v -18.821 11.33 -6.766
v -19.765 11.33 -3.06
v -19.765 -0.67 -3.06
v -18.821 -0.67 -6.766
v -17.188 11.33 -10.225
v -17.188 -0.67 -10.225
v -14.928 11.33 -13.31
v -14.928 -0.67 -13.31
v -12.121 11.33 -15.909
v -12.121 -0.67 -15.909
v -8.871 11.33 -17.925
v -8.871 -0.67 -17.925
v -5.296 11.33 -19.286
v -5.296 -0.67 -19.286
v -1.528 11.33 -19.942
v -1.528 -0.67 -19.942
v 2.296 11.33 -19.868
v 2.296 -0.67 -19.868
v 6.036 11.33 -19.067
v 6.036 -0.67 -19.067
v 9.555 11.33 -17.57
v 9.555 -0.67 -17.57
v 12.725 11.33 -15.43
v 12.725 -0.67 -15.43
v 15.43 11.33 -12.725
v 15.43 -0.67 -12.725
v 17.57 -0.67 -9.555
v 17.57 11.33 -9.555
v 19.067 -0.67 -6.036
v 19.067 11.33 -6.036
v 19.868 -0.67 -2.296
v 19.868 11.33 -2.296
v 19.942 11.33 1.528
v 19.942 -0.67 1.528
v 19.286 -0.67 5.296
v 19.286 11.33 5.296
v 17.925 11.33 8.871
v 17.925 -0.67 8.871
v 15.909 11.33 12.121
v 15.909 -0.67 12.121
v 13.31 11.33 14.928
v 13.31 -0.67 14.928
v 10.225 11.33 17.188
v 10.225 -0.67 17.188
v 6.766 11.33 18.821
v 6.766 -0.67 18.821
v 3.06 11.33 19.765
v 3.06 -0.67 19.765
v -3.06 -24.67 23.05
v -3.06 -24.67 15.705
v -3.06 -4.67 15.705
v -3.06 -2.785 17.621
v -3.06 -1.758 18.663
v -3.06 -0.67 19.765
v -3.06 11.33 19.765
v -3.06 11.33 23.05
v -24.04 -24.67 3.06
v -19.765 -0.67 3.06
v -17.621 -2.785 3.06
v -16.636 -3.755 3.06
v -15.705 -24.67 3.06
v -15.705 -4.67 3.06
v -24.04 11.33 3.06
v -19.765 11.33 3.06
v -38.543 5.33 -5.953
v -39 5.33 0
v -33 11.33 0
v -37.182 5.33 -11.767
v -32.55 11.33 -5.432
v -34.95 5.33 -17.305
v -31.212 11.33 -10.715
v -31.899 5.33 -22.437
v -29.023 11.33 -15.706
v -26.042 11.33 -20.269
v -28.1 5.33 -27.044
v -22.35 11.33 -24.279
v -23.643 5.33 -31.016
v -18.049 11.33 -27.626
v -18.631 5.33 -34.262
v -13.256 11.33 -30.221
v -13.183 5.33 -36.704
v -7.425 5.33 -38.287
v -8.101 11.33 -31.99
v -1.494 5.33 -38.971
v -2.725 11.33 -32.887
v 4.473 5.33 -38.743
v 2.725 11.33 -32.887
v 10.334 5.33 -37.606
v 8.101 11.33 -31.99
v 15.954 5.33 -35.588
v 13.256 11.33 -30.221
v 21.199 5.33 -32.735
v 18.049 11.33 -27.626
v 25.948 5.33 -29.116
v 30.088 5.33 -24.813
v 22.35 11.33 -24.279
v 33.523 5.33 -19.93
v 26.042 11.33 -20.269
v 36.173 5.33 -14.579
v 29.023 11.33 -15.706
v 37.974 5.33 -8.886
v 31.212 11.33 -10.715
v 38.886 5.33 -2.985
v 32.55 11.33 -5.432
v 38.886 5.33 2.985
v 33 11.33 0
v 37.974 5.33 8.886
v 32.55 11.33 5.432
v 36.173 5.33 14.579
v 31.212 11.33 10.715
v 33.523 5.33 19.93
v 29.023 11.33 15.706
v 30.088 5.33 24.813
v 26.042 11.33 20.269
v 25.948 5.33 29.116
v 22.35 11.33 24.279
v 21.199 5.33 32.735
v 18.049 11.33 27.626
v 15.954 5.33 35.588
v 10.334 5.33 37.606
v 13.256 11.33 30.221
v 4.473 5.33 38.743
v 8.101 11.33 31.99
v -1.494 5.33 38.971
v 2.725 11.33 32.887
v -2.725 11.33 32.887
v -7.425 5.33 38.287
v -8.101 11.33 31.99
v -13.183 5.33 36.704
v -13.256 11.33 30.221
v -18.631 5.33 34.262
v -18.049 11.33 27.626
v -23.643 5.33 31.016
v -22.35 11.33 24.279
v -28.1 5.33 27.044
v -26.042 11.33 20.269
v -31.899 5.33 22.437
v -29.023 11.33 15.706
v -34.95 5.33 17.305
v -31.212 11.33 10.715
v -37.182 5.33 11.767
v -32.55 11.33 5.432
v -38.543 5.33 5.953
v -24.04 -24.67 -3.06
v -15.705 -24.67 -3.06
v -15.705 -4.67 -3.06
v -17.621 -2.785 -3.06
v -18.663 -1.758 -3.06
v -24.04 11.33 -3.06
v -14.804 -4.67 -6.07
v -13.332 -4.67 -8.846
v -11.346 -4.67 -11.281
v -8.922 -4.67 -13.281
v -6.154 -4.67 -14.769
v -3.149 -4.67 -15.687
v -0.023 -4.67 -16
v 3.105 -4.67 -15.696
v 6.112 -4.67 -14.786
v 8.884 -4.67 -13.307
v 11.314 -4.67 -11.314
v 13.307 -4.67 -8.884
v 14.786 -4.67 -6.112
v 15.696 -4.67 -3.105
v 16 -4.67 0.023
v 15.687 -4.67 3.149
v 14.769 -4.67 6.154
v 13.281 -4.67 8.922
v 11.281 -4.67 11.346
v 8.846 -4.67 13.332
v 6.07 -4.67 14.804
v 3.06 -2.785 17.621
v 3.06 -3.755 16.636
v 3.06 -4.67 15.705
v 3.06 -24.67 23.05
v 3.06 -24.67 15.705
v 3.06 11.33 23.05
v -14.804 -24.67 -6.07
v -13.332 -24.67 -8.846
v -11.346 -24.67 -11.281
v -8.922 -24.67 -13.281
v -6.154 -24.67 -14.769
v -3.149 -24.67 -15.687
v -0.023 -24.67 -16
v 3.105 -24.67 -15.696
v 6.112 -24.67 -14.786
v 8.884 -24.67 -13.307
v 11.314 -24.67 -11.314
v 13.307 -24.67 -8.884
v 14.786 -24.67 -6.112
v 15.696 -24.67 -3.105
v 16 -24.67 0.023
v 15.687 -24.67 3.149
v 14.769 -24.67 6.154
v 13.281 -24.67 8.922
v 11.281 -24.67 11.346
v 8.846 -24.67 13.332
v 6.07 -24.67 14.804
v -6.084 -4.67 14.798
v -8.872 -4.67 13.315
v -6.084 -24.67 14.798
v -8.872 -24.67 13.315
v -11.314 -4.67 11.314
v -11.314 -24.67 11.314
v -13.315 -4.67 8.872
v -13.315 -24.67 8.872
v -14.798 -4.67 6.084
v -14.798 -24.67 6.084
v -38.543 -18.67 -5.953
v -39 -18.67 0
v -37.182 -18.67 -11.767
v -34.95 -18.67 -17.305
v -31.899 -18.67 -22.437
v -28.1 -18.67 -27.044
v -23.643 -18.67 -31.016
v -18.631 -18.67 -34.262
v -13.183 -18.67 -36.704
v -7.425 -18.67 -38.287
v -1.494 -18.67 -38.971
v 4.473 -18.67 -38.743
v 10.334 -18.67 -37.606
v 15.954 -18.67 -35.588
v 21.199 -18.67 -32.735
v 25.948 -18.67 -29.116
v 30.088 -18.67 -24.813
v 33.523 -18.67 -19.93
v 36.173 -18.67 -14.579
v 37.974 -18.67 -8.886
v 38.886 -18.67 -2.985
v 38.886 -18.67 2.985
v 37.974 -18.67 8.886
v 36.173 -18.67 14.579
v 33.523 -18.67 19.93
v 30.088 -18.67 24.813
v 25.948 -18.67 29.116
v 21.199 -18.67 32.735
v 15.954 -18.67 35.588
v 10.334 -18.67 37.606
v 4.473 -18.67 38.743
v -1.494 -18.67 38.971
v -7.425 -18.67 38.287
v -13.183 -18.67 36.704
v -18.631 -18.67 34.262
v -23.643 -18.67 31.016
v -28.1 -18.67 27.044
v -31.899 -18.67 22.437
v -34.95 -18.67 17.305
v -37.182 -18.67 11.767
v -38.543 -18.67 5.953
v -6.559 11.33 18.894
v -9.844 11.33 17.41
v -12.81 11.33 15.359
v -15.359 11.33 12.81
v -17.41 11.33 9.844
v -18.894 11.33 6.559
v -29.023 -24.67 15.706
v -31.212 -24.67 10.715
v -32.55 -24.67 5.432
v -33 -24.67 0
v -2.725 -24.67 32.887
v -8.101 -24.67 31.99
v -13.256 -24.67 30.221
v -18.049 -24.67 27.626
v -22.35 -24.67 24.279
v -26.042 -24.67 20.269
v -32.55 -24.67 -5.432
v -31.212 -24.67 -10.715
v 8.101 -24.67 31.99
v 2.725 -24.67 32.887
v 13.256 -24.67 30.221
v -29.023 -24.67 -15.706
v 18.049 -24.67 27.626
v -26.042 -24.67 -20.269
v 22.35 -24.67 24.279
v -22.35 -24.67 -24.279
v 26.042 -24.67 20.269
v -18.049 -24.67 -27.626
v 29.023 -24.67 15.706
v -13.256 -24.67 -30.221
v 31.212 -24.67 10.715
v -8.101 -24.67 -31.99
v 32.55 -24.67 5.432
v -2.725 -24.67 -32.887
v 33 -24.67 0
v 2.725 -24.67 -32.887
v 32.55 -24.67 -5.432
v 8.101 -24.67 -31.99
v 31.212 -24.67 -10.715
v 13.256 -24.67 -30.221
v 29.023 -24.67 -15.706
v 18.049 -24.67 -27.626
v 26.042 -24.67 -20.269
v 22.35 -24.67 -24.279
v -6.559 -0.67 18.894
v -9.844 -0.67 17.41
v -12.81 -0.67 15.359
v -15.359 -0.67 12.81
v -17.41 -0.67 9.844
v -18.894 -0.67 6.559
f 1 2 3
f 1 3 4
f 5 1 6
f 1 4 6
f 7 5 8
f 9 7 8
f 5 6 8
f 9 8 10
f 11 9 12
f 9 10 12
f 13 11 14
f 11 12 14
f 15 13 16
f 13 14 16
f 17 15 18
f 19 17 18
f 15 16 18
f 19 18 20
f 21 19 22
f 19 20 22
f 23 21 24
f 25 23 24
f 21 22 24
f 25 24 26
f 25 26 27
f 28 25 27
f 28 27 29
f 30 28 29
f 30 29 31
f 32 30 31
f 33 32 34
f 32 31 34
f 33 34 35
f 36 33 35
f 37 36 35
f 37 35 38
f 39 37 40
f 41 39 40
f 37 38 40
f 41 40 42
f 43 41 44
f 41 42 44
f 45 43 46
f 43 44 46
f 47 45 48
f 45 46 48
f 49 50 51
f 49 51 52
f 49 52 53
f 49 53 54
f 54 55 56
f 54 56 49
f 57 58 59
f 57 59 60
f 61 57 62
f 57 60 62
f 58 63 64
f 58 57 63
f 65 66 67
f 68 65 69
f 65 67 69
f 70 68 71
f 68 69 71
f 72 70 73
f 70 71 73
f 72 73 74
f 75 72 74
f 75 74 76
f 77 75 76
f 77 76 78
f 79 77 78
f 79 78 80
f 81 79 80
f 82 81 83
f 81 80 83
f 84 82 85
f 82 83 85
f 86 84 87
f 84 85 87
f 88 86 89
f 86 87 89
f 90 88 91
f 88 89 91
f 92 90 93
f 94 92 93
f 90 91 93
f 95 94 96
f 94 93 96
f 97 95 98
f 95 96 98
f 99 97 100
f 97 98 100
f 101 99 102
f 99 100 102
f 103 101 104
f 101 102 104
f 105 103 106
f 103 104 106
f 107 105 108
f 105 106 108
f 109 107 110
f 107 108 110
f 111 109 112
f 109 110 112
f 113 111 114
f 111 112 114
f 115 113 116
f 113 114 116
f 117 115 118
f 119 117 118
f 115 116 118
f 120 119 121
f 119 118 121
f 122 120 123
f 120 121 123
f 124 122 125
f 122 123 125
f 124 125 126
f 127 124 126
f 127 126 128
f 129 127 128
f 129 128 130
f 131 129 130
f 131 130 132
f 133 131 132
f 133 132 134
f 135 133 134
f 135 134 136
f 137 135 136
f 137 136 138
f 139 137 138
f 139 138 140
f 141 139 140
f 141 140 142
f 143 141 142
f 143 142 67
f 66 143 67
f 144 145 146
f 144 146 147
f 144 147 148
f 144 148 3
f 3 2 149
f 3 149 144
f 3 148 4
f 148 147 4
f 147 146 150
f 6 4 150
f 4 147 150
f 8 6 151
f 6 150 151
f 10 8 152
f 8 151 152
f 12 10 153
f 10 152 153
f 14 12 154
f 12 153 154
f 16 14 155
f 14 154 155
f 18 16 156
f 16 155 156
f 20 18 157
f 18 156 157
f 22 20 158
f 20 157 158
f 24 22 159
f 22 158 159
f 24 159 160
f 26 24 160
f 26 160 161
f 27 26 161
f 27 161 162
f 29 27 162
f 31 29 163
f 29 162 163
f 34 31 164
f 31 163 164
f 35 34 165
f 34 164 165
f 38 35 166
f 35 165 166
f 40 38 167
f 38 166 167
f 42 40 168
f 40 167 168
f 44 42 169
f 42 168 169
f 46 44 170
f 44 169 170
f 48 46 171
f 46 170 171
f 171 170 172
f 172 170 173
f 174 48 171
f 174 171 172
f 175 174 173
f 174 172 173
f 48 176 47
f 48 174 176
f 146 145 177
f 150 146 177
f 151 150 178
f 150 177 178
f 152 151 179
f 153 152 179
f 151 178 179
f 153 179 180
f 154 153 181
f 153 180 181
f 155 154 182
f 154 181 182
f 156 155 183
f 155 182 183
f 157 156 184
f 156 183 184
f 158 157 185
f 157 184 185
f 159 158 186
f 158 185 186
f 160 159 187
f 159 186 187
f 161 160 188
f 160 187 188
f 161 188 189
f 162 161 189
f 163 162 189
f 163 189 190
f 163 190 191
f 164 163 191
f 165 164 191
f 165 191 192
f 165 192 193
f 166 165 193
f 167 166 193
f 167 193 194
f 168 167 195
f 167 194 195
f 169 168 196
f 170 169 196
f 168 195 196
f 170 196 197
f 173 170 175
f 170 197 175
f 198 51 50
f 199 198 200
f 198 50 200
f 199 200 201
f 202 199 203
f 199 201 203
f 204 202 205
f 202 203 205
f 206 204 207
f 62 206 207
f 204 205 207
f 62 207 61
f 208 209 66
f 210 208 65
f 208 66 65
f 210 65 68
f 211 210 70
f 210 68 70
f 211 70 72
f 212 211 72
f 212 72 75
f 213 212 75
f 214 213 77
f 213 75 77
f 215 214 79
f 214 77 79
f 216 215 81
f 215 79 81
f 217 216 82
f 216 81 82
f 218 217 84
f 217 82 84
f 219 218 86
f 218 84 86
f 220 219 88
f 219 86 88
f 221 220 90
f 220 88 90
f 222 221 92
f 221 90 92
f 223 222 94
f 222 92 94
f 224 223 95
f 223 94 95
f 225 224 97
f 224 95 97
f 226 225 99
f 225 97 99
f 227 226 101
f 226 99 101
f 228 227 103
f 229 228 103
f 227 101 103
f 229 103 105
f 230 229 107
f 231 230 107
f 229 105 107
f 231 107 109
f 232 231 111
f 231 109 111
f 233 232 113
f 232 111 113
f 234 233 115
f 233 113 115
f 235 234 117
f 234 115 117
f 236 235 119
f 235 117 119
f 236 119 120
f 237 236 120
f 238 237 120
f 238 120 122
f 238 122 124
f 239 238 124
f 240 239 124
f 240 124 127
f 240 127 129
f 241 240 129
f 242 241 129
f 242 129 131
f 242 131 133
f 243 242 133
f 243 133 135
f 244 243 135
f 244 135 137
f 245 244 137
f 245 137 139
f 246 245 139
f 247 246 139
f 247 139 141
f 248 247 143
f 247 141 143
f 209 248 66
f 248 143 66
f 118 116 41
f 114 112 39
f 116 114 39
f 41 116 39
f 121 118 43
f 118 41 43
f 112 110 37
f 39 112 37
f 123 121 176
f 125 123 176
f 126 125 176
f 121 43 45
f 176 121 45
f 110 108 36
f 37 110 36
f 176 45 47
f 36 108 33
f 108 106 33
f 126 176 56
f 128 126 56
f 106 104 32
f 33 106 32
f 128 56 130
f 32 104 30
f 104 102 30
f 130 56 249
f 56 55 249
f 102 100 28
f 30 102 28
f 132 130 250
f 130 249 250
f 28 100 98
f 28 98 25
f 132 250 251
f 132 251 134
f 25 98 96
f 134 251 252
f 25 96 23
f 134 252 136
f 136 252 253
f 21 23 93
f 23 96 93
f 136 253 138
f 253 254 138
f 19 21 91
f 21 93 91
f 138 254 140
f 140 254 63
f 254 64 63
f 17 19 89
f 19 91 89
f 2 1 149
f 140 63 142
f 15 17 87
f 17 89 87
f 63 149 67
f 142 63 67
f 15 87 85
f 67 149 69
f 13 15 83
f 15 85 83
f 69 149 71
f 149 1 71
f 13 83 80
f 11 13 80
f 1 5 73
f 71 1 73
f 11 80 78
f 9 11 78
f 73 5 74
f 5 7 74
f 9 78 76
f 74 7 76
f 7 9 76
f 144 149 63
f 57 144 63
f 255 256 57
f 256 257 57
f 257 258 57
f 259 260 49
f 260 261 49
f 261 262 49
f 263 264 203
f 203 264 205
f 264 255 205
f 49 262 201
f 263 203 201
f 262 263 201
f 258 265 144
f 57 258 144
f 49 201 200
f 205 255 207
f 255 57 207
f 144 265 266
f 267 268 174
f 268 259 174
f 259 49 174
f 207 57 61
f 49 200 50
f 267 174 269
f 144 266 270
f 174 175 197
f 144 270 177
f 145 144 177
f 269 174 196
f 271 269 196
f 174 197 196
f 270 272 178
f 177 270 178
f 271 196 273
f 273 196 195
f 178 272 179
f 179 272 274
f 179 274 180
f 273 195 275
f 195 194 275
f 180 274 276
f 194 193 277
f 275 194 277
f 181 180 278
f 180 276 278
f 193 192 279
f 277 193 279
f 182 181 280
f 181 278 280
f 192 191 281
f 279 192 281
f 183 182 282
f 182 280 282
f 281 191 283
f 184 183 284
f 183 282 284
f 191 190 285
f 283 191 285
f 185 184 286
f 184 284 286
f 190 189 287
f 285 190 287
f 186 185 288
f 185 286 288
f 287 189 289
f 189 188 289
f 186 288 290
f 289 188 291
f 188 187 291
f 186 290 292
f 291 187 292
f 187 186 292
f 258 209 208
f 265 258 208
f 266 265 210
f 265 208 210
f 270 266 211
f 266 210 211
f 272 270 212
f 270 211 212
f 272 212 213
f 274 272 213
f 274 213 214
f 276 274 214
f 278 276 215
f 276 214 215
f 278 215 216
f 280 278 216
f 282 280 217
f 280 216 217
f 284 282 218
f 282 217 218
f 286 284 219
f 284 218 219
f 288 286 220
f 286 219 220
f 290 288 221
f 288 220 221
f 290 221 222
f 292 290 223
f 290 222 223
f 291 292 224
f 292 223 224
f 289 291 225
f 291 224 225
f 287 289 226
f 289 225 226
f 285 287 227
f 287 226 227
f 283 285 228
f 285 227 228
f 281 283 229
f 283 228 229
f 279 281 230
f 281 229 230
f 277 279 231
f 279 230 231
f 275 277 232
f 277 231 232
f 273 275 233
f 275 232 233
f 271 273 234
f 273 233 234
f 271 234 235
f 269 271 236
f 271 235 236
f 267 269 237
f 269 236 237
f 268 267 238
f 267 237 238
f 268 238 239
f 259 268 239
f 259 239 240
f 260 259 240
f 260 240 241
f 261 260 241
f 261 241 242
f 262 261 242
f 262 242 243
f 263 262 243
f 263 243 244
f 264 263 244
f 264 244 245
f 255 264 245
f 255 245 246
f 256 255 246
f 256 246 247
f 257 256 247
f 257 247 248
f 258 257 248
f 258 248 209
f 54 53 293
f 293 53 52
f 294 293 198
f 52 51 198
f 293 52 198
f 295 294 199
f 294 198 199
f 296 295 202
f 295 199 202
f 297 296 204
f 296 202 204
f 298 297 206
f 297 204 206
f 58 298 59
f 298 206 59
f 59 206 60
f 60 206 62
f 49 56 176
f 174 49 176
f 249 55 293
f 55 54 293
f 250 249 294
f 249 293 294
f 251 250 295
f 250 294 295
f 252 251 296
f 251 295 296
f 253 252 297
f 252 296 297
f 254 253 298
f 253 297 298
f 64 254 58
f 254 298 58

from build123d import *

# Parameters (mm, degrees)
CHAMFER2_SIZE      = 6
CUT_EXTRUDE2_DEPTH = 29
CHAMFER5_SIZE      = 6


with BuildPart() as part:
    # Sketch2 → Revolve2 (revolve)
    with BuildSketch(Plane.XY):
        Polygon((-16, -24.670336976), (-39, -24.670336976), (-39, 11.329663024), (-20, 11.329663024), (-20, -0.670336976), (-16, -4.670336976), align=None)
    revolve(axis=Axis((0, 25, 0), (0, -1, 0)))

    # Chamfer2
    chamfer2_edges = [part.edges().sort_by_distance(p)[0] for p in [
        (39, -24.670336976, 0),
    ]]
    chamfer(chamfer2_edges, length=CHAMFER2_SIZE)

    # Sketch8 → Cut-Extrude2 (cut, symmetric)
    with BuildSketch(Plane(origin=(0, 0, 0), x_dir=(1, 0, 0), z_dir=(0, 1, 0))):
        Polygon((3.06, 0), (0, 0), (0, -3.06), (-3.06, -3.06), (-3.06, -23.05), (3.06, -23.05), align=None)
        Polygon((-3.06, -3.06), (-3.06, 0), (0, 0), (0, 3.06), (-24.04, 3.06), (-24.04, -3.06), align=None)
    extrude(amount=CUT_EXTRUDE2_DEPTH, both=True, mode=Mode.SUBTRACT)

    # Chamfer5
    chamfer5_edges = [part.edges().sort_by_distance(p)[0] for p in [
        (39, 11.329663024, 0),
    ]]
    chamfer(chamfer5_edges, length=CHAMFER5_SIZE)


solid = part.part
